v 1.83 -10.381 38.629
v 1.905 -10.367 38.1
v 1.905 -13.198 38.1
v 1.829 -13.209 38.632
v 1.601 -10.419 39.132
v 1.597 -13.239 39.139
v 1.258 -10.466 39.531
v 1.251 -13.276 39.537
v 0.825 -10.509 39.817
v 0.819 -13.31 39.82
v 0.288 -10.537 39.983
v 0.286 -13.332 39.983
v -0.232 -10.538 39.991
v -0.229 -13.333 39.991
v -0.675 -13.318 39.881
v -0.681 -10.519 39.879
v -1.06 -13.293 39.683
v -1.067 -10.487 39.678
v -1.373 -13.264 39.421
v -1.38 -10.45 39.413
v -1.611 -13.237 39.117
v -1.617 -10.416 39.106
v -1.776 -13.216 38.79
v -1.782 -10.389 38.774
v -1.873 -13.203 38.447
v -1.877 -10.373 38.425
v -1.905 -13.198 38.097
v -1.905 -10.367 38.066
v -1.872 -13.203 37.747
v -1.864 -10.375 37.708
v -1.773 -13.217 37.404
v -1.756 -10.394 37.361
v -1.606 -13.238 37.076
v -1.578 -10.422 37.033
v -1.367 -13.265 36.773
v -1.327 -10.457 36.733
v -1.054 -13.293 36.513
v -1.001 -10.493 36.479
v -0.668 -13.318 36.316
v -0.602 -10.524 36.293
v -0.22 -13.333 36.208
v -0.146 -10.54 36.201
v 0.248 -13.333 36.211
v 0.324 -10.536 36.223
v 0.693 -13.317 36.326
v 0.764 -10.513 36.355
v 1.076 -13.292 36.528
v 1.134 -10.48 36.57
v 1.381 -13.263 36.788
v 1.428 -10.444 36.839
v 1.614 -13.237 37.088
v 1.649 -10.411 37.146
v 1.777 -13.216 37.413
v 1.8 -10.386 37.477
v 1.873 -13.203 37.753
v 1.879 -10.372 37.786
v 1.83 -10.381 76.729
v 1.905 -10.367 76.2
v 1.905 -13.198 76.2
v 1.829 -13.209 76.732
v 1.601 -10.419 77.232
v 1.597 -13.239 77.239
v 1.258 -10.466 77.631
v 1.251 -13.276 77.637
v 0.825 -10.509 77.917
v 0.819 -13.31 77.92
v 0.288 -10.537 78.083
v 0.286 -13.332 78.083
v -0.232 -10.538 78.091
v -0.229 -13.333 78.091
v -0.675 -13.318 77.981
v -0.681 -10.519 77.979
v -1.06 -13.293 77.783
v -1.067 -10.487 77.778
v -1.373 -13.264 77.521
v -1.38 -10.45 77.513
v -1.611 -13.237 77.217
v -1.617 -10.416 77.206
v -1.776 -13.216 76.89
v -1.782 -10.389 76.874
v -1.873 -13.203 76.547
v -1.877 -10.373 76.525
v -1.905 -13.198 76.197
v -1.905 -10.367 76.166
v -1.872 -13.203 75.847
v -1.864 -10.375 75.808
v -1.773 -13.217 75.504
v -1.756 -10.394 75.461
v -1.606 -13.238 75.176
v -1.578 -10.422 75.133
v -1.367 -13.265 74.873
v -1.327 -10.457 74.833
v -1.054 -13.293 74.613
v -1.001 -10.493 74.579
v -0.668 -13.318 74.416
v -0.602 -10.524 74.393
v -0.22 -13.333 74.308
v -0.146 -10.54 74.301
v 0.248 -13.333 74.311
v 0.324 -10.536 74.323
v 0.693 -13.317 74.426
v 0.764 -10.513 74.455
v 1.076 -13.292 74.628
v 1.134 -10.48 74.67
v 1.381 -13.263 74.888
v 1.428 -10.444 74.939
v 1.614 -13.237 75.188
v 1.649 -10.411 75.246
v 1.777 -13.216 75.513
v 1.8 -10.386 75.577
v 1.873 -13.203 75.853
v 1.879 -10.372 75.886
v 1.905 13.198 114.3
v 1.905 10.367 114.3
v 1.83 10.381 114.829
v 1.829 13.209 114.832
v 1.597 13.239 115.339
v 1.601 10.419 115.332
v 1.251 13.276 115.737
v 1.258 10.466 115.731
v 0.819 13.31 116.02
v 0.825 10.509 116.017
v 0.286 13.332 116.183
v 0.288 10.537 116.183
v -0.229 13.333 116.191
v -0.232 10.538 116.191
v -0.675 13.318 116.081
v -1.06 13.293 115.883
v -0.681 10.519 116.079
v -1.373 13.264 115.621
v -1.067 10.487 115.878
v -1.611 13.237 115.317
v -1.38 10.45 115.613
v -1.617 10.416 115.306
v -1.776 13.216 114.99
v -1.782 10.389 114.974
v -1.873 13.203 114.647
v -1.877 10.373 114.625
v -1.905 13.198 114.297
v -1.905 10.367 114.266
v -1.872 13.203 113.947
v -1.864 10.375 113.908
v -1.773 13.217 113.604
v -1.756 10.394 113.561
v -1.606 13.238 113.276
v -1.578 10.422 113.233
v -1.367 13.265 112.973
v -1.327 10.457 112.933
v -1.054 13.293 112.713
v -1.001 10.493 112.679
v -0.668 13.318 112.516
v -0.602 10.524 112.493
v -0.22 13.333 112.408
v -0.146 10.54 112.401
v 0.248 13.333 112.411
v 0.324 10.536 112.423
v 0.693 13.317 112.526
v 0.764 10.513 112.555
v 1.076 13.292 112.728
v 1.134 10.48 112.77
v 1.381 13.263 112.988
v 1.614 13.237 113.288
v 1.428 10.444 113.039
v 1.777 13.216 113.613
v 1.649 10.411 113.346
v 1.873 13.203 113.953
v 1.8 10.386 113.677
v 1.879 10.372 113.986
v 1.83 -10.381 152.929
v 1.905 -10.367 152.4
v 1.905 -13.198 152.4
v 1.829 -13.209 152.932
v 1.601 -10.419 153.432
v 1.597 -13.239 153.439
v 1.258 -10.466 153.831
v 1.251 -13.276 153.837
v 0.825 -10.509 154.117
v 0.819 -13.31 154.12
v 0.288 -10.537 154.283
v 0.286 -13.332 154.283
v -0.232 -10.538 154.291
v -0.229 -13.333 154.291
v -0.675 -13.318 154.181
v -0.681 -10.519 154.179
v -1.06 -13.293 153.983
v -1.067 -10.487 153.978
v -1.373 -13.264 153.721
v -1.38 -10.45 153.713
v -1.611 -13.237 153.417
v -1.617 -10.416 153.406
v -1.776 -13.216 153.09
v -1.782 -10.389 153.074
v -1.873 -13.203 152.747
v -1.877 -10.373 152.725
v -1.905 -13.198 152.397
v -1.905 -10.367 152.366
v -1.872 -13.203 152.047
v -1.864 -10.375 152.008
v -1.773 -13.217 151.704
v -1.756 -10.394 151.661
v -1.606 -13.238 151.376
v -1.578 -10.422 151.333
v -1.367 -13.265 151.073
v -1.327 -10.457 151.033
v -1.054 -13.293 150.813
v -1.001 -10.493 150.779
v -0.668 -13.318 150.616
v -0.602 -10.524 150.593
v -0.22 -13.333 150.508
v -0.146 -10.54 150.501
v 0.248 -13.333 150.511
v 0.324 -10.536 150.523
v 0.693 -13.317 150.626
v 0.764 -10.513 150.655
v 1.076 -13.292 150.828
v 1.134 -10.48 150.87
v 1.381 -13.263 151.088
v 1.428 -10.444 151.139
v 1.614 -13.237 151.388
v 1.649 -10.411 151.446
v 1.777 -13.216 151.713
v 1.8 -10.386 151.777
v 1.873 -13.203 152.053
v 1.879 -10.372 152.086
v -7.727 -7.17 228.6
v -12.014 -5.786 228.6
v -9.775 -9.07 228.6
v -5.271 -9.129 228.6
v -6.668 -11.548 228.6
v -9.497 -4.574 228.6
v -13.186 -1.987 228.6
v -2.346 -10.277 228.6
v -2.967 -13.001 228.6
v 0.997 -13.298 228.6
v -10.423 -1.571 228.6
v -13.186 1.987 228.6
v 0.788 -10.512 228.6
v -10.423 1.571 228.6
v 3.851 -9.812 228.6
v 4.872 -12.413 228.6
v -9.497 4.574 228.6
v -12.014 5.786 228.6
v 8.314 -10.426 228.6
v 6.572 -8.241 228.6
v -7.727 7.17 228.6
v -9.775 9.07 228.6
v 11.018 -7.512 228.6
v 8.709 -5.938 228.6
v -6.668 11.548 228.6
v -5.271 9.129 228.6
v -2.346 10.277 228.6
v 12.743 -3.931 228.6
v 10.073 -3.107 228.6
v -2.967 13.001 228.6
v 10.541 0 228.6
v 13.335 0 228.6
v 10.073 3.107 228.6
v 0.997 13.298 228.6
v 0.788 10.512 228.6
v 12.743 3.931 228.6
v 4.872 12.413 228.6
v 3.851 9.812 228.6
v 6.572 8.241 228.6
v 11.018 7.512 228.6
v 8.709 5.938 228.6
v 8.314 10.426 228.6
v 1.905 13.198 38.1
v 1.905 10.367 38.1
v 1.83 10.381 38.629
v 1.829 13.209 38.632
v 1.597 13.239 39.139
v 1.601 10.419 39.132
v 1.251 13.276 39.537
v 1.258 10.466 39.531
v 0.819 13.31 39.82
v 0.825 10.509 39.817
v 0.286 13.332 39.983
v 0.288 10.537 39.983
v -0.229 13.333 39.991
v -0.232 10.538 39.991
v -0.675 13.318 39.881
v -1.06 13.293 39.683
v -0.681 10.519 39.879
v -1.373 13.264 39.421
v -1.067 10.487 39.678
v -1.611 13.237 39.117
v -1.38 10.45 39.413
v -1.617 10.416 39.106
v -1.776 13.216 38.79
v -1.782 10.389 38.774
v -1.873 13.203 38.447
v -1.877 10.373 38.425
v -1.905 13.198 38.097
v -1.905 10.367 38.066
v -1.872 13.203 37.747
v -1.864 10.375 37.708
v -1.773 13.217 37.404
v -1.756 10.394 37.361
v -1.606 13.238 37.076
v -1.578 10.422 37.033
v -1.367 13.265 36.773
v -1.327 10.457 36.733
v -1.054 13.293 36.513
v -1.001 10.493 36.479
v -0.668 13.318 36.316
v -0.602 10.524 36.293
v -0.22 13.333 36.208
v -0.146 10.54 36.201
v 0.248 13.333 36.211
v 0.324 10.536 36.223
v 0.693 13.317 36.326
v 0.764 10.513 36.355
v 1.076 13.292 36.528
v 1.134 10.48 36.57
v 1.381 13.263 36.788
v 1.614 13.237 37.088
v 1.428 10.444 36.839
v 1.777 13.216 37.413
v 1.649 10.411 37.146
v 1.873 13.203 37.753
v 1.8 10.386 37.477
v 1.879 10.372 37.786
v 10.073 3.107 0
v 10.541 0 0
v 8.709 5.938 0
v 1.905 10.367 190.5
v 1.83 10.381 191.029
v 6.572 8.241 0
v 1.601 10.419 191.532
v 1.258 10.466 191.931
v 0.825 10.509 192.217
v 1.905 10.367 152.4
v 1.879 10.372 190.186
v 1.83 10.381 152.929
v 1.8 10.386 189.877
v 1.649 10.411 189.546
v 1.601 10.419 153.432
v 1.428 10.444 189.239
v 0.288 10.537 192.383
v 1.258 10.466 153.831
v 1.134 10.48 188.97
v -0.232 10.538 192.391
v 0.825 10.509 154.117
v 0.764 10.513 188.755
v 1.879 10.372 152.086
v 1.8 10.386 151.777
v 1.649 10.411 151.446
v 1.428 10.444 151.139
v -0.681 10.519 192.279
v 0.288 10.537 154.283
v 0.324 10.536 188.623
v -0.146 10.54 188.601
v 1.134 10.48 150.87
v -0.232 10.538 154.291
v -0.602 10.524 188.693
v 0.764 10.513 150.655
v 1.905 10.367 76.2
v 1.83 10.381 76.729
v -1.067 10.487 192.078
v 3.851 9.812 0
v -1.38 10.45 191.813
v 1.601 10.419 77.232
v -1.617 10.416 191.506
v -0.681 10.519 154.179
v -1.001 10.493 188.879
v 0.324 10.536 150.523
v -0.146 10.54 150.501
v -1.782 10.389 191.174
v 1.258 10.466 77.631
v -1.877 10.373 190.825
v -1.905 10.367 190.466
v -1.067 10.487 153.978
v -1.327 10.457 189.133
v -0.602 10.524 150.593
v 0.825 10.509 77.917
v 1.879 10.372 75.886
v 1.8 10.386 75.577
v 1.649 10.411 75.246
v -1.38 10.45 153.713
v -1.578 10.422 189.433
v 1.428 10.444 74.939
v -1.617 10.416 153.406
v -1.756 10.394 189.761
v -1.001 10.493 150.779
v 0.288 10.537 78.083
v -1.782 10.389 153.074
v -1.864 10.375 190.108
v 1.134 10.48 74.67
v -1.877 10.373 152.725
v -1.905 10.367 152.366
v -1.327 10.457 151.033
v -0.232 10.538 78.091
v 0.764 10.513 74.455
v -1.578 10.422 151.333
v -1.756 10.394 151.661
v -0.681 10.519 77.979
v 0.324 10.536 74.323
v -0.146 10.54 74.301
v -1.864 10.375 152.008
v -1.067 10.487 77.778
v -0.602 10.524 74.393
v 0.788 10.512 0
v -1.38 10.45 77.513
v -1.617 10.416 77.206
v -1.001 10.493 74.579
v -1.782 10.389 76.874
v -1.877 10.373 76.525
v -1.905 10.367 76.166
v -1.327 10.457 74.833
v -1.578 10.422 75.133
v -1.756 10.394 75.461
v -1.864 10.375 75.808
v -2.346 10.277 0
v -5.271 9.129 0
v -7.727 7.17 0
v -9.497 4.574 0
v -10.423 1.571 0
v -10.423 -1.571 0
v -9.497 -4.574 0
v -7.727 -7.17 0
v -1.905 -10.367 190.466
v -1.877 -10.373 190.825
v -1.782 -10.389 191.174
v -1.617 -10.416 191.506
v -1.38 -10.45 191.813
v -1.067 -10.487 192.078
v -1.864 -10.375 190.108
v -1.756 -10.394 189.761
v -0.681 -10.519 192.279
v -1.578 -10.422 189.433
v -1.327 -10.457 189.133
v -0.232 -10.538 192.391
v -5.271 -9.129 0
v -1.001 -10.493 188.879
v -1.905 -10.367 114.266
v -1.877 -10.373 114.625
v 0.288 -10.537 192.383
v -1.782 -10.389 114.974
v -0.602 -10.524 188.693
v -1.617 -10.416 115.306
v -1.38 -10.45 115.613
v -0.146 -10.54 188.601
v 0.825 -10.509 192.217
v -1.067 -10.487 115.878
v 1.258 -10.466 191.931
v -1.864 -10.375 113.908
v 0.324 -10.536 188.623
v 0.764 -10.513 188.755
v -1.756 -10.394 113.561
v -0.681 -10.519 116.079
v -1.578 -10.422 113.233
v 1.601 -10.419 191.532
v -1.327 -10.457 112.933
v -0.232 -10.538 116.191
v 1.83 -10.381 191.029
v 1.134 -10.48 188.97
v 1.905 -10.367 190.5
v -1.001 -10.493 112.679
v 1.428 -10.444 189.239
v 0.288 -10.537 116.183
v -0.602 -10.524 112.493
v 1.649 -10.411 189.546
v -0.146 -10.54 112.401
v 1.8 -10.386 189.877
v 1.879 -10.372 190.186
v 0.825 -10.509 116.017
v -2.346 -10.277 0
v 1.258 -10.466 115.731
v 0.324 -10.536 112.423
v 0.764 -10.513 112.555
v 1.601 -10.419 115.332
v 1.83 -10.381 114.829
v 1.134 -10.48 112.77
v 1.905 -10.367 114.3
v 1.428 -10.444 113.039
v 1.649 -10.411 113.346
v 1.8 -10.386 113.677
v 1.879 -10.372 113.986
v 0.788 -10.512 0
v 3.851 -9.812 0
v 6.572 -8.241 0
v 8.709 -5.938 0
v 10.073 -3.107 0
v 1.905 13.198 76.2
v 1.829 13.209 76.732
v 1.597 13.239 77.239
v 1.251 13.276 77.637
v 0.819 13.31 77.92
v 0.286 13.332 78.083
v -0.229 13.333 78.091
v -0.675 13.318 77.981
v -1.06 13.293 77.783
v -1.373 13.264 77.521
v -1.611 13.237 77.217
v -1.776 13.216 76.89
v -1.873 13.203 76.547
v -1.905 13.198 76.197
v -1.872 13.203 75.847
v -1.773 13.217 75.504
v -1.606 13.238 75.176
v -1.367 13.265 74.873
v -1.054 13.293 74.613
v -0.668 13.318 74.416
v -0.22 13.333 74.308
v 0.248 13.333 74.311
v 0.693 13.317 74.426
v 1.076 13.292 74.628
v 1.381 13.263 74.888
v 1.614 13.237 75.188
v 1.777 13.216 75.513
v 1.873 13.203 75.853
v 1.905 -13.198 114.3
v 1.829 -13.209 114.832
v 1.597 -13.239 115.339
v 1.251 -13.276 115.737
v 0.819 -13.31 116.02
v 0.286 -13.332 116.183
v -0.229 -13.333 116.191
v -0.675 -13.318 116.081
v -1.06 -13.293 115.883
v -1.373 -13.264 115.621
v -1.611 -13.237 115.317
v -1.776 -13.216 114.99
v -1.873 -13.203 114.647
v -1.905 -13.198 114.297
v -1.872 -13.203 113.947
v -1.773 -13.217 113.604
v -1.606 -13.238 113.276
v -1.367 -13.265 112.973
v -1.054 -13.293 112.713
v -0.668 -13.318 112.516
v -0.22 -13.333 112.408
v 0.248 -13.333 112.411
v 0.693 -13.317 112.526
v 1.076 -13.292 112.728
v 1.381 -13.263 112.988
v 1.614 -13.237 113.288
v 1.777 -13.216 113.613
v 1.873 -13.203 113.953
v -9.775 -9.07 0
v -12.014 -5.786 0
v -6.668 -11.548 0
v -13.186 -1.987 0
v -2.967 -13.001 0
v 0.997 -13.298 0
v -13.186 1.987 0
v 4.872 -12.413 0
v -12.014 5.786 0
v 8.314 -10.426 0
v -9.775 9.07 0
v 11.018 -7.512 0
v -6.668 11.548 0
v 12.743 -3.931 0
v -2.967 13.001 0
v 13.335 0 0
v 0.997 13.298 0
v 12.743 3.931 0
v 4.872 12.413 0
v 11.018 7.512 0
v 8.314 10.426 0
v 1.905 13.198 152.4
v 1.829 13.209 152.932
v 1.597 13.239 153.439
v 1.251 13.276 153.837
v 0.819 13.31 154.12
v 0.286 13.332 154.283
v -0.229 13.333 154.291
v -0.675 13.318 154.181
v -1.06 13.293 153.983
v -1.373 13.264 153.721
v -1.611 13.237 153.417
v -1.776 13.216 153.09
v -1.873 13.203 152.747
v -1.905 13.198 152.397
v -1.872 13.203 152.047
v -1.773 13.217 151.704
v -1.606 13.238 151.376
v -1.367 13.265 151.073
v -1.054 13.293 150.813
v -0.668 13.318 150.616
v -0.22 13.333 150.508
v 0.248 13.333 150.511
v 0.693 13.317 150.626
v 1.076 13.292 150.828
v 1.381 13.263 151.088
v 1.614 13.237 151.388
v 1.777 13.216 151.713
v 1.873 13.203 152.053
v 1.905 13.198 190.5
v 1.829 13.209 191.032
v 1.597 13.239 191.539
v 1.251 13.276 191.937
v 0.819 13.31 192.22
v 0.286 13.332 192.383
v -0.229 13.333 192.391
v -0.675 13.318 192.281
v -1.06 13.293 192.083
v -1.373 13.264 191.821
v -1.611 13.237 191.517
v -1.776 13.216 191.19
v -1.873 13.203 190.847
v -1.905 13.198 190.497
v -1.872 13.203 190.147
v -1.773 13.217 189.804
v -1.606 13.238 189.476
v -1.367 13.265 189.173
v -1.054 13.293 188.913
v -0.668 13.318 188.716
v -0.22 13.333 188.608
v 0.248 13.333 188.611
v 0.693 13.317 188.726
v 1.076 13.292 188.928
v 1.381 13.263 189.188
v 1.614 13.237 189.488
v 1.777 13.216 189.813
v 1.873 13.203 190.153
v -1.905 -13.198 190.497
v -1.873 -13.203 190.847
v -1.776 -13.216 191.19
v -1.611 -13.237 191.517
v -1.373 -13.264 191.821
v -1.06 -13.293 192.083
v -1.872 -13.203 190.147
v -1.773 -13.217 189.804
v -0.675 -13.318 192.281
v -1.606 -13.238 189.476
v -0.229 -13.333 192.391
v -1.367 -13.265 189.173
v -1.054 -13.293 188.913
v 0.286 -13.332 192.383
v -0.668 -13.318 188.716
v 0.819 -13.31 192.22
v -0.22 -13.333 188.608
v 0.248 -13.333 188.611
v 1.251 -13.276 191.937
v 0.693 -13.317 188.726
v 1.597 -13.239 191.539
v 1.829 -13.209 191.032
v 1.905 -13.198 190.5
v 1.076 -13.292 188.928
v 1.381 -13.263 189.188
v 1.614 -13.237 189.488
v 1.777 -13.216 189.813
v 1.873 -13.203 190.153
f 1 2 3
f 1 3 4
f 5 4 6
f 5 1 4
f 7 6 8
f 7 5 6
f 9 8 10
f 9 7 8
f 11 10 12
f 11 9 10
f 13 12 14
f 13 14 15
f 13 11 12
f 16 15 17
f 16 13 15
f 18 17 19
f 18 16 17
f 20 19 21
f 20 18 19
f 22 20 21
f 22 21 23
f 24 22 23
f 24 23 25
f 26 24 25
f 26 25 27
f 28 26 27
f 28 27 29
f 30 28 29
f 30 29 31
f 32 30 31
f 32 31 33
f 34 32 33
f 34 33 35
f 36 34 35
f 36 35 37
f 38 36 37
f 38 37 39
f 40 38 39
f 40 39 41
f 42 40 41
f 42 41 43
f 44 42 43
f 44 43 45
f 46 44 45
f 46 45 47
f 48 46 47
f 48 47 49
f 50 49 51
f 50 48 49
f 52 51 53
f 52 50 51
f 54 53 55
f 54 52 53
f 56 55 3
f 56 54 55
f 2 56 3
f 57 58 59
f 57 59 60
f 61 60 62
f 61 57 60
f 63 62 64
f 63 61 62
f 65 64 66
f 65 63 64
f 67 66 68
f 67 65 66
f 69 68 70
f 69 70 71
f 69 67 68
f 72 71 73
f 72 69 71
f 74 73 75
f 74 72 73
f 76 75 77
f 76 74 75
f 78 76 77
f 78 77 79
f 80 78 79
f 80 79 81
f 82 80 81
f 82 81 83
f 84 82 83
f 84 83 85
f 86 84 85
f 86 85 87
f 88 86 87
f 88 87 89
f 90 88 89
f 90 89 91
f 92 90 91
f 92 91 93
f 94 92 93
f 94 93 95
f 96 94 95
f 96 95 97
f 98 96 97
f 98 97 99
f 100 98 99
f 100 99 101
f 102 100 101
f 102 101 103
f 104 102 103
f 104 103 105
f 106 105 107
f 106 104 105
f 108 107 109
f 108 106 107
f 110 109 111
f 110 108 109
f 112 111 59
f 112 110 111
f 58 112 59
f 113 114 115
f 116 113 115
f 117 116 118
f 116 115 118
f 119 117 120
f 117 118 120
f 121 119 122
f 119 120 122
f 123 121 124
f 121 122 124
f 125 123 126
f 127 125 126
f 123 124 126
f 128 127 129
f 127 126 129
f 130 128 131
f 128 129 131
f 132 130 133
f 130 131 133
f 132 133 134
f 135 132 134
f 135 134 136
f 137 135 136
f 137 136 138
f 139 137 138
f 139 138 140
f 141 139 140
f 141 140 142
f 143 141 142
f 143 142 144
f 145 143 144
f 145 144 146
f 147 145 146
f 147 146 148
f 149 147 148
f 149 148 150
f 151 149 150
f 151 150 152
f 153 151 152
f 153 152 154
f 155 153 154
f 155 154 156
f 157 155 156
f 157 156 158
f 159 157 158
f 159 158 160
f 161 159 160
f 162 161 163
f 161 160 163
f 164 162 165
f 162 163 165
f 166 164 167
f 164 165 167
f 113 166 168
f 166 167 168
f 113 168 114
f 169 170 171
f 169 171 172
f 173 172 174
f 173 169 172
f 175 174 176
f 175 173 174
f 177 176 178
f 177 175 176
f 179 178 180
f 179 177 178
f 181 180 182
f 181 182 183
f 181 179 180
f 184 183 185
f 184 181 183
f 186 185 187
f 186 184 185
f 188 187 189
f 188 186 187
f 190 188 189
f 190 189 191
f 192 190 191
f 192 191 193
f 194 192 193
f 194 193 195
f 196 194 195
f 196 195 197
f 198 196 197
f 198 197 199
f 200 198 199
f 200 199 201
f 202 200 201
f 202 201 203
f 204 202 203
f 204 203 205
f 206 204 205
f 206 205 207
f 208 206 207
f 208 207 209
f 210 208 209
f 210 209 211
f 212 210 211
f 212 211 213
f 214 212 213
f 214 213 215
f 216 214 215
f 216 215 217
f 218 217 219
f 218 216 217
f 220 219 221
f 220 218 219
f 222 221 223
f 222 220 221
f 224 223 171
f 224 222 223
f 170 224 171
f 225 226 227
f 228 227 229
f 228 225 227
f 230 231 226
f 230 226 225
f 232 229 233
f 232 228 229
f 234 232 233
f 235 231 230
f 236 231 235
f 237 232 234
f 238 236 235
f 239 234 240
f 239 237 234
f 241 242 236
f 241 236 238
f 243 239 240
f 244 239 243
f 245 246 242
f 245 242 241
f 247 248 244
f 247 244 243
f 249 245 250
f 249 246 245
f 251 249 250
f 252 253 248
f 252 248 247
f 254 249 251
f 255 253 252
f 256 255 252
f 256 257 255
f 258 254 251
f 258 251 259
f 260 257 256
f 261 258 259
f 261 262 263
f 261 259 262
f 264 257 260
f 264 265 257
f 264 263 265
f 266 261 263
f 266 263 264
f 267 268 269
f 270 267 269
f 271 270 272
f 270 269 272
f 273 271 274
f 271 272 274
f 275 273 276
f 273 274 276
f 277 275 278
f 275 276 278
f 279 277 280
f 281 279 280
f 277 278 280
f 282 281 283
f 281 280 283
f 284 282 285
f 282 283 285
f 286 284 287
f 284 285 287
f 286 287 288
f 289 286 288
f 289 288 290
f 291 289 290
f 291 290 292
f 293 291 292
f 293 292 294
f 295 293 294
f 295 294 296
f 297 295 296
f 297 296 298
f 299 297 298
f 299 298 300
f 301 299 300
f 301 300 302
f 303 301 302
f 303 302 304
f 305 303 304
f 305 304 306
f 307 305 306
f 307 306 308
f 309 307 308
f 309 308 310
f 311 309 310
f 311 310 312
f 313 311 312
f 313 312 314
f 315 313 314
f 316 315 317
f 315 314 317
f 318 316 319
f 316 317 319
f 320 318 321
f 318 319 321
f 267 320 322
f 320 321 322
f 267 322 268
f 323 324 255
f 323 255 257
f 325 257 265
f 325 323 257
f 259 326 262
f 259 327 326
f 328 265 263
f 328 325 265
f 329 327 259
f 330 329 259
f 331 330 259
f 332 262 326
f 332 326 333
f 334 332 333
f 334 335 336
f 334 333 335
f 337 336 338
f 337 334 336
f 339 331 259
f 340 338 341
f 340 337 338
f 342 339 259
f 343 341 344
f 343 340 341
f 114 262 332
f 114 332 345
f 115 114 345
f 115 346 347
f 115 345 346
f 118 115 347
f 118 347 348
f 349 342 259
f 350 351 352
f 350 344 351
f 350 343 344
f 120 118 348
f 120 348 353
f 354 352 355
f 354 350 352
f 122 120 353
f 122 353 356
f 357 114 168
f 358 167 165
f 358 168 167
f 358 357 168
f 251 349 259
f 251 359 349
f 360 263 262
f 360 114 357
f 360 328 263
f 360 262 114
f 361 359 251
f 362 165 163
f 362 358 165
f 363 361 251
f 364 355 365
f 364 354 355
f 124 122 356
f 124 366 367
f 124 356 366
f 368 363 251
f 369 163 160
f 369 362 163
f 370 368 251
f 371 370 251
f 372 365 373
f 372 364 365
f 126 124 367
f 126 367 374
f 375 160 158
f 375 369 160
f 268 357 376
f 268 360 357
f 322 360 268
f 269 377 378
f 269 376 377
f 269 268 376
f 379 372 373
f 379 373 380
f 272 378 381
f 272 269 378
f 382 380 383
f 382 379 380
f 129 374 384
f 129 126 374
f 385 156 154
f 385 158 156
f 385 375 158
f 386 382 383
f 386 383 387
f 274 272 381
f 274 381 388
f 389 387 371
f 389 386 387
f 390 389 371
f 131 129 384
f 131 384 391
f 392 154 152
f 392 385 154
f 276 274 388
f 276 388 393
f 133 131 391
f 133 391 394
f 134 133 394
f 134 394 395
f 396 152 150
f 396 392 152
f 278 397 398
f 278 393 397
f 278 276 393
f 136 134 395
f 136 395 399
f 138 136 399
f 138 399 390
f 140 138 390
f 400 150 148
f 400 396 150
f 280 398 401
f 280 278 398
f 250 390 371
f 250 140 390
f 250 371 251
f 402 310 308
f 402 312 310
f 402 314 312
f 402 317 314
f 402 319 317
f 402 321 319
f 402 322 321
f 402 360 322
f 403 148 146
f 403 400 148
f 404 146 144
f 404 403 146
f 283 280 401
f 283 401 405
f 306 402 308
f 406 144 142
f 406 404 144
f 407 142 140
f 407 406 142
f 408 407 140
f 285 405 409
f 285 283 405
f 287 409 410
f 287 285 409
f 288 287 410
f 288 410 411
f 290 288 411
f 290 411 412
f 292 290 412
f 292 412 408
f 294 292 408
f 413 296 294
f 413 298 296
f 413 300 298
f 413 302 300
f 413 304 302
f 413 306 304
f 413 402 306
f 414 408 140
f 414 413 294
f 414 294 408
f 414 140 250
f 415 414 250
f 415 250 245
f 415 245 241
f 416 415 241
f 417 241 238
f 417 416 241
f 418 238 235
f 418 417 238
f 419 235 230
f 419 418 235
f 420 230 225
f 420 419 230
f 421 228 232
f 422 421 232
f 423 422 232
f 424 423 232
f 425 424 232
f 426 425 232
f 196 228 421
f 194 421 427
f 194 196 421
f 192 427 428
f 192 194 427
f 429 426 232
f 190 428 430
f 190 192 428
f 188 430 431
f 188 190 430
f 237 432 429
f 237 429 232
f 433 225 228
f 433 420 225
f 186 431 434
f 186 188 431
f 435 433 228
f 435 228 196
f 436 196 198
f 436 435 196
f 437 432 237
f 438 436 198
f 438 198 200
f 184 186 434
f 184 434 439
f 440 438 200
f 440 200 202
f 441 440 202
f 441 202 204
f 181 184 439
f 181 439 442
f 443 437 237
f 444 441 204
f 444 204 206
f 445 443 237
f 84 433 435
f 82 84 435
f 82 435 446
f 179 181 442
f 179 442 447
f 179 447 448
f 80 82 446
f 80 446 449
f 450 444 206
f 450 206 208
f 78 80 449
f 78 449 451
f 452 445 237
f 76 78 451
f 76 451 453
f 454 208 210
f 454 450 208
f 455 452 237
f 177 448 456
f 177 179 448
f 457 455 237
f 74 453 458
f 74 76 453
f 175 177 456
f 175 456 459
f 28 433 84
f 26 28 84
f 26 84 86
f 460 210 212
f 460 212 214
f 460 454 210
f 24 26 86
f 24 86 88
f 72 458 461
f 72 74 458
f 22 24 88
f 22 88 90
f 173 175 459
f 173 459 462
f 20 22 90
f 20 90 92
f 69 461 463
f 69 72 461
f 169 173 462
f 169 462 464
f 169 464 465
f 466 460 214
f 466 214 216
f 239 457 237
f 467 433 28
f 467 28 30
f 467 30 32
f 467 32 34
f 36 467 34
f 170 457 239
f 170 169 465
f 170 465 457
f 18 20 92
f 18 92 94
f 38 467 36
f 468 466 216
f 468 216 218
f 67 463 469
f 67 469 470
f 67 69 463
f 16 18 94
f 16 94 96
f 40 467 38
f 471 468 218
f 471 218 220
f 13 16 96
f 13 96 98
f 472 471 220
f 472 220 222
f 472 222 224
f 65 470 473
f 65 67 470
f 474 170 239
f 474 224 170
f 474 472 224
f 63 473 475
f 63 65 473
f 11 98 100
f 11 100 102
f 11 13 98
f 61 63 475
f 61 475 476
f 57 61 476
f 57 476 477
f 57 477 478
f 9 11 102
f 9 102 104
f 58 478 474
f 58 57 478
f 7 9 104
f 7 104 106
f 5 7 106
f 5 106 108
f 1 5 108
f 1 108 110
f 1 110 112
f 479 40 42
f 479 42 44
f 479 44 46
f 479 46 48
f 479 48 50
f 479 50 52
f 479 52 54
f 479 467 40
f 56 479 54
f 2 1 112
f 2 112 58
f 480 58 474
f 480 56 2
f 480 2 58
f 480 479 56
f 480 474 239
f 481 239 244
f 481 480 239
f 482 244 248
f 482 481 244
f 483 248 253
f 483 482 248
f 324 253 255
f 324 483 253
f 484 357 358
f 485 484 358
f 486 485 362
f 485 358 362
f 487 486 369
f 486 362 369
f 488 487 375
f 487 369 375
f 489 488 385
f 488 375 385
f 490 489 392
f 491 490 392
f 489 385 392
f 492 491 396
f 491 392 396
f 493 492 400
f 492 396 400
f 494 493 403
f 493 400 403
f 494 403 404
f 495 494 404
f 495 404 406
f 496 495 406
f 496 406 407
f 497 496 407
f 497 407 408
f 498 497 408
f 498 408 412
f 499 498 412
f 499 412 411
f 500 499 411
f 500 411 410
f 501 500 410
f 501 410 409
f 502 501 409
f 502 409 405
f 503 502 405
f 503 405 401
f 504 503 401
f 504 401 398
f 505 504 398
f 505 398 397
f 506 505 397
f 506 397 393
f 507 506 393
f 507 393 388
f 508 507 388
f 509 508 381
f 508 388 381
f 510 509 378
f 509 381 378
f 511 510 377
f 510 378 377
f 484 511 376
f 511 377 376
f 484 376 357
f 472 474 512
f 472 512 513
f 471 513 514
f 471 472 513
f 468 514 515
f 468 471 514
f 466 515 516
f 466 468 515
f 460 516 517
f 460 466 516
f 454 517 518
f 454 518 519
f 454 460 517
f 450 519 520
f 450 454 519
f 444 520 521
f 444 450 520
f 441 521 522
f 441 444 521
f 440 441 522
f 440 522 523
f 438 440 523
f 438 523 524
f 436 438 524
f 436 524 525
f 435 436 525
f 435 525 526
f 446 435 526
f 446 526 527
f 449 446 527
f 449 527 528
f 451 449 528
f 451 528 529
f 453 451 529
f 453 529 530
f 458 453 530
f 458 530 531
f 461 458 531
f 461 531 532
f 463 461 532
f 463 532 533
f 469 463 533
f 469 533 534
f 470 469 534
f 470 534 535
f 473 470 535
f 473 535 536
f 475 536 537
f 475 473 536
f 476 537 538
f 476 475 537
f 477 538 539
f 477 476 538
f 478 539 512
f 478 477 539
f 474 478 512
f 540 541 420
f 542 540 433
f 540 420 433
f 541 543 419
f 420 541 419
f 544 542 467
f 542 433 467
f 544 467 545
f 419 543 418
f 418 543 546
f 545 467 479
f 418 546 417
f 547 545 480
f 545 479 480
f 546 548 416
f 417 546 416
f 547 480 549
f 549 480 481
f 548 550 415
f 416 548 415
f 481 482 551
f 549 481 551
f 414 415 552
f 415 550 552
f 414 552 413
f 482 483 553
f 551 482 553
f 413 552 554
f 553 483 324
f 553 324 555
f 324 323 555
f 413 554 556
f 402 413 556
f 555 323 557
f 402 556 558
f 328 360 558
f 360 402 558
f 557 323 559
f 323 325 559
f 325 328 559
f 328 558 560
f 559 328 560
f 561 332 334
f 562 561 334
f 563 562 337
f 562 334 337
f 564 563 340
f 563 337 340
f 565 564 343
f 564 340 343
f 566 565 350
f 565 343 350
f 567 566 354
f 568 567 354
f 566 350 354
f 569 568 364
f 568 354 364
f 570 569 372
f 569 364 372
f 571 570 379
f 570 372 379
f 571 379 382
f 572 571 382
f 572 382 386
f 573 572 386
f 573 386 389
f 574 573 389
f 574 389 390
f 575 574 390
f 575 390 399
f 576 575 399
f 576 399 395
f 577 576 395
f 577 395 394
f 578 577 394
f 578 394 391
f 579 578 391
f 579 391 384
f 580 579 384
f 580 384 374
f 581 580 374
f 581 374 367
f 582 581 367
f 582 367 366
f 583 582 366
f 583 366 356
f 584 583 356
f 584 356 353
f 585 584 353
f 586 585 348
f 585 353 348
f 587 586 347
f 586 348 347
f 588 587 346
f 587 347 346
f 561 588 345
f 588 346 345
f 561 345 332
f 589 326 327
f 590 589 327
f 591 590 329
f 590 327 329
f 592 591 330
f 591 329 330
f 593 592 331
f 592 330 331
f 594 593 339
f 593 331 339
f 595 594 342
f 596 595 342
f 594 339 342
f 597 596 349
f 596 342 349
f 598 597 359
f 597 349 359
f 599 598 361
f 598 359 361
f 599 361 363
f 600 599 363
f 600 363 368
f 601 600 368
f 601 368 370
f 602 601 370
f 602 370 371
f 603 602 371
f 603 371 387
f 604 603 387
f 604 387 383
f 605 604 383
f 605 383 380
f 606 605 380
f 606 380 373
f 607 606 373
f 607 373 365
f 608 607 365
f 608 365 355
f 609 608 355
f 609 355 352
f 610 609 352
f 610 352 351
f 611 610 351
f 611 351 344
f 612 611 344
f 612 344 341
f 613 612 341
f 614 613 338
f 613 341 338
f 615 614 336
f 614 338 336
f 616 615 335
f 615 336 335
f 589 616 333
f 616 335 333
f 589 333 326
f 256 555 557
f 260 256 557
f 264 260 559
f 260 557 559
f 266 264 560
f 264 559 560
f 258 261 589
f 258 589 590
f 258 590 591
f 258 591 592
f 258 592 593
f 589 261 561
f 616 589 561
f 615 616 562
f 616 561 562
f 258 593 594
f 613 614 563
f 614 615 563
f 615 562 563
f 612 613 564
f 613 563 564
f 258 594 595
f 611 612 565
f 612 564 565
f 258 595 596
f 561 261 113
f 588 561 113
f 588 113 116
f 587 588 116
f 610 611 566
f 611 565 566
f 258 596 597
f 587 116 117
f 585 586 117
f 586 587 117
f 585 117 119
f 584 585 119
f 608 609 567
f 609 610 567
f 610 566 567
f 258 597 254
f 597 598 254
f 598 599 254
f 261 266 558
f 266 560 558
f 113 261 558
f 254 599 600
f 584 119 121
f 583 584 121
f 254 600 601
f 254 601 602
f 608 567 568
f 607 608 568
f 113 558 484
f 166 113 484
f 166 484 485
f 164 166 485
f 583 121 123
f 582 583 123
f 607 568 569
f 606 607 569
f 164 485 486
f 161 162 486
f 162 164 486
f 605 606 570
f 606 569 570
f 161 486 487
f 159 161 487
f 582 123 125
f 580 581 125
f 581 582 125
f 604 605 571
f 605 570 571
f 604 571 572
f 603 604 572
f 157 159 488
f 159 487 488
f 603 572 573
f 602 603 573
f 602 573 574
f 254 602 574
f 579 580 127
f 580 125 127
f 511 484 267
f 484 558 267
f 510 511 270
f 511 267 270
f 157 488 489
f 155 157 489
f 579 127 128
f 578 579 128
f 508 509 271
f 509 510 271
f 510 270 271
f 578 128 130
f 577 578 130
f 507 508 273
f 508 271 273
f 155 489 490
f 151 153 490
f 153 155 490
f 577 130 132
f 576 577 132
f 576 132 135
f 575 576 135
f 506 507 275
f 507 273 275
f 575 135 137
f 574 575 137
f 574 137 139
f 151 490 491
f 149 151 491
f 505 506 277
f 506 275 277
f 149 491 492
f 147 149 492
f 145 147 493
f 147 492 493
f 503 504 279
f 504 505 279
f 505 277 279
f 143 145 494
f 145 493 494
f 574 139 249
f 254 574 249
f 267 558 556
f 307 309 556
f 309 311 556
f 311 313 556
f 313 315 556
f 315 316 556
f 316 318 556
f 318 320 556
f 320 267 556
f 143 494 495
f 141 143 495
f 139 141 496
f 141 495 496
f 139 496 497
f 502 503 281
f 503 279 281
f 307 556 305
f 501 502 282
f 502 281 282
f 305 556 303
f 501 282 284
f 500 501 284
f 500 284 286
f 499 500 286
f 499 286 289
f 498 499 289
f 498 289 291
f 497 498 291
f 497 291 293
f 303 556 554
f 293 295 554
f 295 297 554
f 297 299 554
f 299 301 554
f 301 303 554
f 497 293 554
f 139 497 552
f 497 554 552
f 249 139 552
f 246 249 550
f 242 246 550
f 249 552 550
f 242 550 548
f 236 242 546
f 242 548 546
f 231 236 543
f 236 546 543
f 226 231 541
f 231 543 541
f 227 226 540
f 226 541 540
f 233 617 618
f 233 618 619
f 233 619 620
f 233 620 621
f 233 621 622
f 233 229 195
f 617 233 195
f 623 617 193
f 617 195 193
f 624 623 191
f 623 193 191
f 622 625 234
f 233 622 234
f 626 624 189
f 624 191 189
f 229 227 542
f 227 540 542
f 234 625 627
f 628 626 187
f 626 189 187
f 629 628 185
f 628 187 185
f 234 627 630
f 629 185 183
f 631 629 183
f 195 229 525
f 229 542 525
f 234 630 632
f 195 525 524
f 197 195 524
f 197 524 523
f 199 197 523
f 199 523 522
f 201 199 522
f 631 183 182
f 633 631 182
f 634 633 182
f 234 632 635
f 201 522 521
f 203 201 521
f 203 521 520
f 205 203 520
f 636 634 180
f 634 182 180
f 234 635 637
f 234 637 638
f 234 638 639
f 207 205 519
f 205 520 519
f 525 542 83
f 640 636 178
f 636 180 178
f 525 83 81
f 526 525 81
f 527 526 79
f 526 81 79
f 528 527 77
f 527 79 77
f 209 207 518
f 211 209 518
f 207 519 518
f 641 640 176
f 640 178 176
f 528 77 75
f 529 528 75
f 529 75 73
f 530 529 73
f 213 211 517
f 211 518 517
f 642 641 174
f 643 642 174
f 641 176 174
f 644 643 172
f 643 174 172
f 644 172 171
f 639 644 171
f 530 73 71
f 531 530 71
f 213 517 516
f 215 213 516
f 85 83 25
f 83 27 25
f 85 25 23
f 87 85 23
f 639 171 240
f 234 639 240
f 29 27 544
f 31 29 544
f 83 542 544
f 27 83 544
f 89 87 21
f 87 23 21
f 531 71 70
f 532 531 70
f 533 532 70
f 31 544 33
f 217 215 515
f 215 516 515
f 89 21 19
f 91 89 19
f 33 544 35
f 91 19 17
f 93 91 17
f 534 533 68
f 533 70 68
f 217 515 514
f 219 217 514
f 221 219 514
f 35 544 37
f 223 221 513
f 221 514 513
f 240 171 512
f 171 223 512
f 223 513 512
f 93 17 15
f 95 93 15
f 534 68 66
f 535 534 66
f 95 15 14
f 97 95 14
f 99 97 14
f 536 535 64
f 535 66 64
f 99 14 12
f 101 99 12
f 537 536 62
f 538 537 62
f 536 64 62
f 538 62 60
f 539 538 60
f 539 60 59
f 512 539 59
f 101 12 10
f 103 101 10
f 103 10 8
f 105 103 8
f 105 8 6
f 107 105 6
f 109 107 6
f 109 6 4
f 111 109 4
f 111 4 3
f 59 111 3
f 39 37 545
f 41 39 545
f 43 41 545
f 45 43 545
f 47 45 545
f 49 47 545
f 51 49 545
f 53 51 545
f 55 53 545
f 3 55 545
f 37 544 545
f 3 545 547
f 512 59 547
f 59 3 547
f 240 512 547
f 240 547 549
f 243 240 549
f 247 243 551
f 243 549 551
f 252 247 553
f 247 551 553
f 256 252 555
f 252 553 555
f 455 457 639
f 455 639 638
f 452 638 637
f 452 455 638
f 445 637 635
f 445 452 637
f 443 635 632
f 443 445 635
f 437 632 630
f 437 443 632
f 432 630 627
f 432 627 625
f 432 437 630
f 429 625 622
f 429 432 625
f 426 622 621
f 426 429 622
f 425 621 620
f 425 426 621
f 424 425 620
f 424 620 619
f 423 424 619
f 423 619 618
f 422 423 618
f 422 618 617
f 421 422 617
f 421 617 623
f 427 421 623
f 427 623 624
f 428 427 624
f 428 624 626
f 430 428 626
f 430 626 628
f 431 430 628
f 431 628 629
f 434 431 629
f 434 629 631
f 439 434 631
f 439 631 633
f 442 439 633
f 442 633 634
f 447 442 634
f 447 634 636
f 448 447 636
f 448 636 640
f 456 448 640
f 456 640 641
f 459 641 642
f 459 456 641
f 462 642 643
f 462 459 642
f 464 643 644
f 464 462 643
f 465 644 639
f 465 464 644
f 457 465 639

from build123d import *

# Parameters (mm, degrees)
F0_R          = 13.335
F0_R_2        = 10.541
F1_DEPTH      = 228.6
F2_R          = 1.905
F3_DEPTH      = 13.336
F3_DEPTH_BACK = 13.336


with BuildPart() as f1:
    # F0 (on Top) → F1 (new body)
    with BuildSketch(Plane.XY):
        Circle(F0_R)
        Circle(F0_R_2, mode=Mode.SUBTRACT)
    extrude(amount=F1_DEPTH)

    # F2 (on Front) → F3 (cut, two sides)
    with BuildSketch(Plane.XZ) as f3_sk:
        with Locations((0, 38.1)):
            Circle(F2_R)
        with Locations((0, 76.2)):
            Circle(F2_R)
        with Locations((0, 114.3)):
            Circle(F2_R)
        with Locations((0, 152.4)):
            Circle(F2_R)
        with Locations((0, 190.5)):
            Circle(F2_R)
    extrude(amount=-F3_DEPTH, mode=Mode.SUBTRACT)
    extrude(f3_sk.sketch, amount=F3_DEPTH_BACK, mode=Mode.SUBTRACT)


solid = f1.part
